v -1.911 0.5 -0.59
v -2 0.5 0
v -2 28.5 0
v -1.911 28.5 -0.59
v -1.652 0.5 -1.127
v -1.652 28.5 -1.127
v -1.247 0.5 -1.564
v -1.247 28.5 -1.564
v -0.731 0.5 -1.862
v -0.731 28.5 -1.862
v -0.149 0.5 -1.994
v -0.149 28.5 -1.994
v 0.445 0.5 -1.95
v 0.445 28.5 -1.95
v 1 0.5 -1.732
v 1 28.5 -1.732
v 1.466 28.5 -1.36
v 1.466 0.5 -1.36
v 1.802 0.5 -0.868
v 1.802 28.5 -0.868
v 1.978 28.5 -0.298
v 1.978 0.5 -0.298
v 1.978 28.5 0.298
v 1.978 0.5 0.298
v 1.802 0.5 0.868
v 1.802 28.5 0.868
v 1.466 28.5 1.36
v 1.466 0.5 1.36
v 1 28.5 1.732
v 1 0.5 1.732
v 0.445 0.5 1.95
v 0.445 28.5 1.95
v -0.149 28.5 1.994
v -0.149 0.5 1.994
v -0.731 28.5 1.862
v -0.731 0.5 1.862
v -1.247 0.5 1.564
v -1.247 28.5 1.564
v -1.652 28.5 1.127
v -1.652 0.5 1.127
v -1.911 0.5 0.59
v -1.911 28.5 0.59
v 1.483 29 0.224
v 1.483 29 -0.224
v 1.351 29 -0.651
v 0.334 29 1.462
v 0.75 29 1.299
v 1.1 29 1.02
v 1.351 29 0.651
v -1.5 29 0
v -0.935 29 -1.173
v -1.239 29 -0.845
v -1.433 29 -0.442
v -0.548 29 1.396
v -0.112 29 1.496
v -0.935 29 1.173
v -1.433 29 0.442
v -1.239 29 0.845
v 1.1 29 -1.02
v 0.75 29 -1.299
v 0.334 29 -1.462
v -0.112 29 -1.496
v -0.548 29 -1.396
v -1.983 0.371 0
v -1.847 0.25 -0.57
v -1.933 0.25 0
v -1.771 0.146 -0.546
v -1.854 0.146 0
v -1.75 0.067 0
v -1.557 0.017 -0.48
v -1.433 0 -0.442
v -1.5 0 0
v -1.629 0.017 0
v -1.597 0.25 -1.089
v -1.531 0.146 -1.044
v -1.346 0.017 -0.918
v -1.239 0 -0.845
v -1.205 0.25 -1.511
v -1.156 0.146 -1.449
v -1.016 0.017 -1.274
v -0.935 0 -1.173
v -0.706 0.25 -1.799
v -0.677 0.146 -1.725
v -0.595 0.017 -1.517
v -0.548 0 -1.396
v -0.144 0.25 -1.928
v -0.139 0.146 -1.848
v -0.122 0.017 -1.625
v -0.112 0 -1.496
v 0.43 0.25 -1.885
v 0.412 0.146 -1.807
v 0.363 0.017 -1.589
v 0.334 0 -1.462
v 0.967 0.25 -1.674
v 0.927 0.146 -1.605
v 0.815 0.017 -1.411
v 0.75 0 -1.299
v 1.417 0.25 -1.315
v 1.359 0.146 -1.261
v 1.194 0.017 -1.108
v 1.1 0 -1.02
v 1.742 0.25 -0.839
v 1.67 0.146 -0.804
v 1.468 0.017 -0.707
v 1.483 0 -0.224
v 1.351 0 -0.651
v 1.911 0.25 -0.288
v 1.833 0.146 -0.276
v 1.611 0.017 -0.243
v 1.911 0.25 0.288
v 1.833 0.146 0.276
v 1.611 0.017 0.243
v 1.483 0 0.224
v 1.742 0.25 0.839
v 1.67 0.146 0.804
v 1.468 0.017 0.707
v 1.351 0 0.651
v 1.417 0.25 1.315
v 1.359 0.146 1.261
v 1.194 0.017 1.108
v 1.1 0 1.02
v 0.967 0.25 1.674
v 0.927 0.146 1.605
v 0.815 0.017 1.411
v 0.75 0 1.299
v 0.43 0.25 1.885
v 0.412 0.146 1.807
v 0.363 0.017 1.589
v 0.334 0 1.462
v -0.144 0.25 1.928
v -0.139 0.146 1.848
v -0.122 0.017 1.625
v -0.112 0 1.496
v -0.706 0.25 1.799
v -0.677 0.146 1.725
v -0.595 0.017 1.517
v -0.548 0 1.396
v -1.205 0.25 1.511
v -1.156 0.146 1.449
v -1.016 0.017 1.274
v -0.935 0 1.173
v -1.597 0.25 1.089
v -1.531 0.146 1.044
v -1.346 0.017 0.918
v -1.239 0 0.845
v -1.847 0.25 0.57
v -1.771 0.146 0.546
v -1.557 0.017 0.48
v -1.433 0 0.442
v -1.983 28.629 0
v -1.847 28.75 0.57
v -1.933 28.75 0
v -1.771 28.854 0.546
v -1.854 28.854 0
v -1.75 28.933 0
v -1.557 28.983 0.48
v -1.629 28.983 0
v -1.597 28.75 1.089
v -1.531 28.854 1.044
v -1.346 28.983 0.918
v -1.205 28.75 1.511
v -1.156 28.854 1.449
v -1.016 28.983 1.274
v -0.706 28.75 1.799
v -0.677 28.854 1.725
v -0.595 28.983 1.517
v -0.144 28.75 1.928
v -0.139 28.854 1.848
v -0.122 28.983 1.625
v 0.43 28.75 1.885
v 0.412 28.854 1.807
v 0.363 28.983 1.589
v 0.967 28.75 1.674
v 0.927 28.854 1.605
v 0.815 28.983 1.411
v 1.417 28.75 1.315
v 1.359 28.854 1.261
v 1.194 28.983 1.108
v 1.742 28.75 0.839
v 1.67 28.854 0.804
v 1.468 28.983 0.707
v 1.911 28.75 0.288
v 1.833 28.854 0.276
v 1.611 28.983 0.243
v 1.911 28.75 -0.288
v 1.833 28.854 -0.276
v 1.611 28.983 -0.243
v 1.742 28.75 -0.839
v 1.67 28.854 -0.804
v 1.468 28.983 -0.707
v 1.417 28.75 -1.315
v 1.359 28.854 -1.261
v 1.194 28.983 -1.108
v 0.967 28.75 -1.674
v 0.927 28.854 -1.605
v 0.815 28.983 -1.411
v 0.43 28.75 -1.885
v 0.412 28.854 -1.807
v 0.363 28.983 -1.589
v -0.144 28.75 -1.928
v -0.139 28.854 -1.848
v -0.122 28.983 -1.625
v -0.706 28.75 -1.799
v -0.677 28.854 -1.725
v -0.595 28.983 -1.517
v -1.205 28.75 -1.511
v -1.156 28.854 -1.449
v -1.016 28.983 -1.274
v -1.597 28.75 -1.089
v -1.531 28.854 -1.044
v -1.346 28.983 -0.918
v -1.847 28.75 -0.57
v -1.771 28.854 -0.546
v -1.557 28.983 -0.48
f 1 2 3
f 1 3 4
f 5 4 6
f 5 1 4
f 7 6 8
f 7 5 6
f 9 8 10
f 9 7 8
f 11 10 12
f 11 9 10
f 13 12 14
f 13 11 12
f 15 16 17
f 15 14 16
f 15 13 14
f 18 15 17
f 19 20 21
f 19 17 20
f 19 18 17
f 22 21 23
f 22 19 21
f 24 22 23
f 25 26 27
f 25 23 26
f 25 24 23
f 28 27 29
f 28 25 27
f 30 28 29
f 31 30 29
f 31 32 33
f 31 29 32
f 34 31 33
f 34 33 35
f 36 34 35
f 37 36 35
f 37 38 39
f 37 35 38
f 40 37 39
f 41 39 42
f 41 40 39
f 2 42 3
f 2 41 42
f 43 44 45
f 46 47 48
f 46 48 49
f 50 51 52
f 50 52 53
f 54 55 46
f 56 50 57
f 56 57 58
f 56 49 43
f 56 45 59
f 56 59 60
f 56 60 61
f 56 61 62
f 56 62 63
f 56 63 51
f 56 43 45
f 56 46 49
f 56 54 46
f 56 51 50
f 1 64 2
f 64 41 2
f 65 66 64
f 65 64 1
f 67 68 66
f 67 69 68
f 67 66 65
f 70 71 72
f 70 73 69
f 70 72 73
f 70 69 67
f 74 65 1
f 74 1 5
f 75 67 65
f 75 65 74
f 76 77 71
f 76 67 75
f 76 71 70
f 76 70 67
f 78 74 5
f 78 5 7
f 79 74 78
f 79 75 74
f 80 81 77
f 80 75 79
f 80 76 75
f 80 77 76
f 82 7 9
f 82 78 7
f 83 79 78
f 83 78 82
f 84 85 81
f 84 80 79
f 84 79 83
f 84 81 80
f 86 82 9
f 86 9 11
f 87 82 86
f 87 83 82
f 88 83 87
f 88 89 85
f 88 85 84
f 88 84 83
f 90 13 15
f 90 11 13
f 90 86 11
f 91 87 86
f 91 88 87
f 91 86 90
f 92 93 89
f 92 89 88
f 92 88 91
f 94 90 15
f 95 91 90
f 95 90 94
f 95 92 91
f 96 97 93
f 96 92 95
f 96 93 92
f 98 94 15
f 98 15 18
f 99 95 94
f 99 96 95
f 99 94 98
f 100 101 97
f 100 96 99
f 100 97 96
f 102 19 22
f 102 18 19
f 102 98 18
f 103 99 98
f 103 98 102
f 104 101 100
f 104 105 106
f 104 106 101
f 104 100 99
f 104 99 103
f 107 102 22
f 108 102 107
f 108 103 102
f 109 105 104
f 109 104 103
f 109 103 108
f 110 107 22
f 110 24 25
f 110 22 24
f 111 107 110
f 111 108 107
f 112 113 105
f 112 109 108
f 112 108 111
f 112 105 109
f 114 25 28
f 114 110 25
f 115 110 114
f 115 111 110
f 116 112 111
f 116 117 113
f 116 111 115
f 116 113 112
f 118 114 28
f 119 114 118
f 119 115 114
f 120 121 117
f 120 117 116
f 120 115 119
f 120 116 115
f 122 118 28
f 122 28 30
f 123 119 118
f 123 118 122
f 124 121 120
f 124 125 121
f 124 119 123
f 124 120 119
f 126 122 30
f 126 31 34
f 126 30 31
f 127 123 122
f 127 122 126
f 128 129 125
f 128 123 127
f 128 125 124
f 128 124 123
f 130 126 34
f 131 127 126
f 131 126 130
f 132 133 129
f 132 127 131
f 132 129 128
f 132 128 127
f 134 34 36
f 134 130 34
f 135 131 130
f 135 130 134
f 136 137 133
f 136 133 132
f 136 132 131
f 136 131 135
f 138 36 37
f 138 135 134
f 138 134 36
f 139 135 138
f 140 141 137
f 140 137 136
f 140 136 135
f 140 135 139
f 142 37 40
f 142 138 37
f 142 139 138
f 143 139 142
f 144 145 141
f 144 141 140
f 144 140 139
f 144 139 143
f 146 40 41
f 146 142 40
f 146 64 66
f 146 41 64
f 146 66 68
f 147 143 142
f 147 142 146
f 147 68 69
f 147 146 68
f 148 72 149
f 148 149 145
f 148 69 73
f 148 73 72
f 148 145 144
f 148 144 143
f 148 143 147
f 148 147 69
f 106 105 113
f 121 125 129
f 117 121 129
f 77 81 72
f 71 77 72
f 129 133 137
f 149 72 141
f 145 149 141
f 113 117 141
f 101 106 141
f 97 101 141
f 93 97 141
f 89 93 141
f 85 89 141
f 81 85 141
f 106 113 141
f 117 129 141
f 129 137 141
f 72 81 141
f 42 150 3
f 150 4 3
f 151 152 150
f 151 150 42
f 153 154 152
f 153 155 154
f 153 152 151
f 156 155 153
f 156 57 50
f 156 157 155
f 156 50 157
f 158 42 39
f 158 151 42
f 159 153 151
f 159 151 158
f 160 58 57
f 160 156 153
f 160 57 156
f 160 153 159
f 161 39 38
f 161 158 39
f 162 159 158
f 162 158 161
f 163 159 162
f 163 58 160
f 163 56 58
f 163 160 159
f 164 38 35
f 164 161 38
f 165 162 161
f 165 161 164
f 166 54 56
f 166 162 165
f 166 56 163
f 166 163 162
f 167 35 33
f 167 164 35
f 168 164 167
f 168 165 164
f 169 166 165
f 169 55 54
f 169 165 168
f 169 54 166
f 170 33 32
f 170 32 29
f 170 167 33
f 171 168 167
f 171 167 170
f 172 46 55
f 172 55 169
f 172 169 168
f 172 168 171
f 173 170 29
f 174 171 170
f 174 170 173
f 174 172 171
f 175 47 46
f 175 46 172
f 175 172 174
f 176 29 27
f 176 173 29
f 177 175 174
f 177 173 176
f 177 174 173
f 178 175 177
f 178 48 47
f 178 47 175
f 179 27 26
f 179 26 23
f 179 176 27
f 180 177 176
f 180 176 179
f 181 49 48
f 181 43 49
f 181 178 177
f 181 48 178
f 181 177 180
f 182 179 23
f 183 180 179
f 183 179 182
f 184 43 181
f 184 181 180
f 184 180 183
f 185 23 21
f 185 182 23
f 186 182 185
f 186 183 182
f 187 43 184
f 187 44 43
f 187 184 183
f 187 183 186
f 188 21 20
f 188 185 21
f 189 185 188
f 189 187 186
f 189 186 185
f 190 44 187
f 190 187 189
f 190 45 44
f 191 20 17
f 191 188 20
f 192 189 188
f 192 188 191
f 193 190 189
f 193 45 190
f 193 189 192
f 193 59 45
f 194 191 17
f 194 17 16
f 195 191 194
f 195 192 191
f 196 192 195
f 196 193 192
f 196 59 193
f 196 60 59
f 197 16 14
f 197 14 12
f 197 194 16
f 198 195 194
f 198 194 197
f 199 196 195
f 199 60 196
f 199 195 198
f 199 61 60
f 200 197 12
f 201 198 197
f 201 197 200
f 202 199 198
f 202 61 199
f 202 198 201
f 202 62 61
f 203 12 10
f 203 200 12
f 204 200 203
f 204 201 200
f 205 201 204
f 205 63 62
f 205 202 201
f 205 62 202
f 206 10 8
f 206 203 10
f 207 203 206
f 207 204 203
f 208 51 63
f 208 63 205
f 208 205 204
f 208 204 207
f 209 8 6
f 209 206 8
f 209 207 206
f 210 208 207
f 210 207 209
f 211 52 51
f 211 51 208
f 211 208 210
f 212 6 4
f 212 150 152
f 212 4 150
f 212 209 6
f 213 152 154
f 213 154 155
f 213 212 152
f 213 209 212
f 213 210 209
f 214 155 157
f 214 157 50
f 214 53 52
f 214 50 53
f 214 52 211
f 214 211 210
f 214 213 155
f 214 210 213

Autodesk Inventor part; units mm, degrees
ref_plane "YZ Plane" through (0, 0, 0) normal (1, 0, 0) x (0, 1, 0)
ref_plane "XZ Plane" through (0, 0, 0) normal (0, 1, 0) x (-1, 0, 0)
ref_plane "XY Plane" through (0, 0, 0) normal (0, 0, 1) x (1, 0, 0)
sketch "スケッチ1" plane through (0, 0, 0) normal (0, 1, 0) x (-1, 0, 0)
  circle A0 centre (0, 0) radius 2
  dimension "d0" = 4
extrude "押し出し1" add sketch "スケッチ1" along normal blind 29
fillet "フィレット1" radius 0.5 1 edges at (2, 29, 0)
fillet "フィレット2" radius 0.5 1 edges at (2, 0, 0)
properties part number "シャフト"
